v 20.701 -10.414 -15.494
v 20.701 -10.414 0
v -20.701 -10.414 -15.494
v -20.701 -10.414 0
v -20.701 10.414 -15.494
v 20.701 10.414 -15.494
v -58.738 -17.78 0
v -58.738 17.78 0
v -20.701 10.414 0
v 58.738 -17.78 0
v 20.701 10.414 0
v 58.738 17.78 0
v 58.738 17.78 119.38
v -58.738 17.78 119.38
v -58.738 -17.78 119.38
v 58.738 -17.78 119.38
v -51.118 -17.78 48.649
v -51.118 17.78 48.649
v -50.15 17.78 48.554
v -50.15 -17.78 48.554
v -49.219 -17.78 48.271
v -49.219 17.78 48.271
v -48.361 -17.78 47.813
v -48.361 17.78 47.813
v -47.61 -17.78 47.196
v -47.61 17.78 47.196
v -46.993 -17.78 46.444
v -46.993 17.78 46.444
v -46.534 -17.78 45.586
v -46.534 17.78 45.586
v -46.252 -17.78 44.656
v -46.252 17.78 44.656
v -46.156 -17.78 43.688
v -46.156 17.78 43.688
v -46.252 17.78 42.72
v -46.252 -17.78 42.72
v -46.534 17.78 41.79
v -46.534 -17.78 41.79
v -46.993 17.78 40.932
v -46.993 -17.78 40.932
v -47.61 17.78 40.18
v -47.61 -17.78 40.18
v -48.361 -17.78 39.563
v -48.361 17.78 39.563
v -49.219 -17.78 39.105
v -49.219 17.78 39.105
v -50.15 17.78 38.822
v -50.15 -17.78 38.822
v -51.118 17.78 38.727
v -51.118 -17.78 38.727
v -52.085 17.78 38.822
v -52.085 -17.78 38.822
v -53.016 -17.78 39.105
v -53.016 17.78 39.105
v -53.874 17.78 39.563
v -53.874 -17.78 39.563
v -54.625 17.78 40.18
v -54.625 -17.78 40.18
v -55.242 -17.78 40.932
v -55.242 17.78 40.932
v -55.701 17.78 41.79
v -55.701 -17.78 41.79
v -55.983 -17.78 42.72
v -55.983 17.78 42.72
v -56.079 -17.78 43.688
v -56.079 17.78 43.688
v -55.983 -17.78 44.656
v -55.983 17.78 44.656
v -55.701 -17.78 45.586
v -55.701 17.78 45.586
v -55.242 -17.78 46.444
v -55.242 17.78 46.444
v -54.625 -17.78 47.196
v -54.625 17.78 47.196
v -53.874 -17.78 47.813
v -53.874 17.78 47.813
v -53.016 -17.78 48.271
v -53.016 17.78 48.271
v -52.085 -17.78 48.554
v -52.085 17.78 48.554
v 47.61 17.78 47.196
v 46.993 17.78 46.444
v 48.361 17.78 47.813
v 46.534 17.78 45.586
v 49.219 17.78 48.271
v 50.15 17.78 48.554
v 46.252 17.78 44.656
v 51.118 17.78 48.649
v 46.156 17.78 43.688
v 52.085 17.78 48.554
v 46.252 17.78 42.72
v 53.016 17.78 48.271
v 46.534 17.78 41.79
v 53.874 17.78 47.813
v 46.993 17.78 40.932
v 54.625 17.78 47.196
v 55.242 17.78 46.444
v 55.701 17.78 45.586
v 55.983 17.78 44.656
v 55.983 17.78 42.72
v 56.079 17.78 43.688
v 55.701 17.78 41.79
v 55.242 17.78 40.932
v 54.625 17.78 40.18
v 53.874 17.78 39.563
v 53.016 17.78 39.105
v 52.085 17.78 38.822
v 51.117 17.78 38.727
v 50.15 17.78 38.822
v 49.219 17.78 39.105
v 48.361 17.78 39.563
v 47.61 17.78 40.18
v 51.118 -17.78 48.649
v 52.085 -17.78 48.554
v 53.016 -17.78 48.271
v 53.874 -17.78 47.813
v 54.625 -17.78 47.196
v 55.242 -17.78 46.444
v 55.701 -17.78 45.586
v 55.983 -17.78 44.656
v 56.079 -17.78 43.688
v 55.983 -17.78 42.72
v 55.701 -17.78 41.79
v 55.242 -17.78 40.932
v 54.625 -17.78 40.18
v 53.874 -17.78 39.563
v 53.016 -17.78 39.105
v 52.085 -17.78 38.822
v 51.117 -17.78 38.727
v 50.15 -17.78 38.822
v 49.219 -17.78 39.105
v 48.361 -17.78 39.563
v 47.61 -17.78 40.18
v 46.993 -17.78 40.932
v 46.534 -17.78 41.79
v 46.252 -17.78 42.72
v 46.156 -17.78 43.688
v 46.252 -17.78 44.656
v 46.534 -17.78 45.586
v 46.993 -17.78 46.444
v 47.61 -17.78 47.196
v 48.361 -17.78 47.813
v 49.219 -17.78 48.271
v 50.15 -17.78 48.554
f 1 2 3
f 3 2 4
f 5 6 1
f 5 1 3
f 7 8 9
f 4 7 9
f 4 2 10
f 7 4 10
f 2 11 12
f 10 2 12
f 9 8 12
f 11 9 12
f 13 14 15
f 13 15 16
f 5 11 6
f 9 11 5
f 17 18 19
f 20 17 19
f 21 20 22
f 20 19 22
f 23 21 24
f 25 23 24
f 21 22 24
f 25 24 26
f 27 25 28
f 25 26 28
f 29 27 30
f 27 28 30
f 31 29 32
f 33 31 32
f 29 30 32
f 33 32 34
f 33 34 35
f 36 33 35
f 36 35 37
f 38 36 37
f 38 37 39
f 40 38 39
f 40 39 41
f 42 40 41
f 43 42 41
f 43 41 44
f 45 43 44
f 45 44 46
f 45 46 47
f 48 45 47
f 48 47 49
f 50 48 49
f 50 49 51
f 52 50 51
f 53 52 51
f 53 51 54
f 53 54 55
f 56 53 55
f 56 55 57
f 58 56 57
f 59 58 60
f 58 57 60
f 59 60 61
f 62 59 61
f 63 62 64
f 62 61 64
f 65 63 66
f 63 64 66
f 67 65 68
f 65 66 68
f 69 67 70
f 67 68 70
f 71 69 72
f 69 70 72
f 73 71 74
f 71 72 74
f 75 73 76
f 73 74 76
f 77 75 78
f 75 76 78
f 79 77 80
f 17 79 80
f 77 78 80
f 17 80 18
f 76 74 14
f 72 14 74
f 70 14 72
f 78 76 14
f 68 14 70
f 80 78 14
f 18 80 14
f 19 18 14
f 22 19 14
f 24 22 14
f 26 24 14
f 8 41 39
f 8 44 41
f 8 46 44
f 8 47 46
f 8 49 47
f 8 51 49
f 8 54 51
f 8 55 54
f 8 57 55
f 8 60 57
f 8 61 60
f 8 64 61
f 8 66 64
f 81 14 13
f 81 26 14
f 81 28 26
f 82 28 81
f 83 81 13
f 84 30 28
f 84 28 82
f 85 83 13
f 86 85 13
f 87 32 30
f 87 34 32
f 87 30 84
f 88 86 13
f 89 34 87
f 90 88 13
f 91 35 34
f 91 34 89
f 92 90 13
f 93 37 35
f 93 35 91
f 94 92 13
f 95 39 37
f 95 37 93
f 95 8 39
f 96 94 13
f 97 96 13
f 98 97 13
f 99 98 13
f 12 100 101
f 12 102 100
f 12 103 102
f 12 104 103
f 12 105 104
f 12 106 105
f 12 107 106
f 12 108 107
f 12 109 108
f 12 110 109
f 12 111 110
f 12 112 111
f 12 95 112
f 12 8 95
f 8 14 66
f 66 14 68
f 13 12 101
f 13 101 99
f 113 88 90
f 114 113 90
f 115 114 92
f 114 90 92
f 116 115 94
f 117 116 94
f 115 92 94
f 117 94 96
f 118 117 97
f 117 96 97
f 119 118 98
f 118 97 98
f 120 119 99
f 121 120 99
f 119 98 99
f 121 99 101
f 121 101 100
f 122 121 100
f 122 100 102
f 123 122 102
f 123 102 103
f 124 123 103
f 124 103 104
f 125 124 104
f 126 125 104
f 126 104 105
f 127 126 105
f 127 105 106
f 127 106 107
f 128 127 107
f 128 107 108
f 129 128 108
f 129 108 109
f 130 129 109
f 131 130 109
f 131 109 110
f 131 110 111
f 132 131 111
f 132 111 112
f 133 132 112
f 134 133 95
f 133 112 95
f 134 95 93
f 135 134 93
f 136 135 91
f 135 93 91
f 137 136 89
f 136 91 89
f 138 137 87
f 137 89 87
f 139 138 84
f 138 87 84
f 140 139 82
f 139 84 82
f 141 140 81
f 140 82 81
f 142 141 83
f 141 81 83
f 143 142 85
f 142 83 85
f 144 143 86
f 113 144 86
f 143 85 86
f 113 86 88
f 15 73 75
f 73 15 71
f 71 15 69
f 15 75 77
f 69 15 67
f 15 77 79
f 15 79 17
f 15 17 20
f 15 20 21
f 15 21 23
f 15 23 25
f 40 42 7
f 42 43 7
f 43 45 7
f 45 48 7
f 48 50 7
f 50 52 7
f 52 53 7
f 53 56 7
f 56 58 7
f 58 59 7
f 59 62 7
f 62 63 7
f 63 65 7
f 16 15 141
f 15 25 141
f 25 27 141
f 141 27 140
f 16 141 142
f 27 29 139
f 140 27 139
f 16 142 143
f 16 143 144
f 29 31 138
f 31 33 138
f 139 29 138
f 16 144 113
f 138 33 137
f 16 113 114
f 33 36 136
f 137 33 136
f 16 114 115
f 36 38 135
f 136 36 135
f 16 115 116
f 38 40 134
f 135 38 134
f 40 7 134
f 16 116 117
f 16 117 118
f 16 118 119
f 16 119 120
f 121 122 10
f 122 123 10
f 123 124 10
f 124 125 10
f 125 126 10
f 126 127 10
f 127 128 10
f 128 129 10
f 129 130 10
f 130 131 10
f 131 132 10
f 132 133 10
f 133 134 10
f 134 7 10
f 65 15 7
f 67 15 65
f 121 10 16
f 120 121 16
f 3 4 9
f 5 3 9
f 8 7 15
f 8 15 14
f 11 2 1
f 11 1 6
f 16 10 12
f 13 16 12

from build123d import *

# Parameters (mm, degrees)
SKETCH1_W                        = 117.475
SKETCH1_H                        = 35.56
EXTRUDE1_DEPTH                   = 119.38
SKETCH2_W                        = 41.402
SKETCH2_H                        = 20.828
EXTRUDE2_DEPTH                   = 15.494
F_25_64_0_39063_DIAMETER_HOLE1_D = 9.922002


with BuildPart() as part:
    # Sketch1 → Extrude1 (new body)
    with BuildSketch(Plane.XY):
        Rectangle(SKETCH1_W, SKETCH1_H)
    extrude(amount=EXTRUDE1_DEPTH)

    # Sketch2 → Extrude2 (add)
    with BuildSketch(Plane(origin=(0, 0, 0), x_dir=(-1, 0, 0), z_dir=(0, 0, -1))):
        Rectangle(SKETCH2_W, SKETCH2_H)
    extrude(amount=EXTRUDE2_DEPTH)

    # 25/64 (0.39063) Diameter Hole1 (through all)
    with Locations(Plane(origin=(-51.1175, -17.78, 43.688), x_dir=(0, 0, -1), z_dir=(0, -1, 0))):
        with Locations((0, 0), (0, 102.235)):
            Hole(F_25_64_0_39063_DIAMETER_HOLE1_D / 2)


solid = part.part
